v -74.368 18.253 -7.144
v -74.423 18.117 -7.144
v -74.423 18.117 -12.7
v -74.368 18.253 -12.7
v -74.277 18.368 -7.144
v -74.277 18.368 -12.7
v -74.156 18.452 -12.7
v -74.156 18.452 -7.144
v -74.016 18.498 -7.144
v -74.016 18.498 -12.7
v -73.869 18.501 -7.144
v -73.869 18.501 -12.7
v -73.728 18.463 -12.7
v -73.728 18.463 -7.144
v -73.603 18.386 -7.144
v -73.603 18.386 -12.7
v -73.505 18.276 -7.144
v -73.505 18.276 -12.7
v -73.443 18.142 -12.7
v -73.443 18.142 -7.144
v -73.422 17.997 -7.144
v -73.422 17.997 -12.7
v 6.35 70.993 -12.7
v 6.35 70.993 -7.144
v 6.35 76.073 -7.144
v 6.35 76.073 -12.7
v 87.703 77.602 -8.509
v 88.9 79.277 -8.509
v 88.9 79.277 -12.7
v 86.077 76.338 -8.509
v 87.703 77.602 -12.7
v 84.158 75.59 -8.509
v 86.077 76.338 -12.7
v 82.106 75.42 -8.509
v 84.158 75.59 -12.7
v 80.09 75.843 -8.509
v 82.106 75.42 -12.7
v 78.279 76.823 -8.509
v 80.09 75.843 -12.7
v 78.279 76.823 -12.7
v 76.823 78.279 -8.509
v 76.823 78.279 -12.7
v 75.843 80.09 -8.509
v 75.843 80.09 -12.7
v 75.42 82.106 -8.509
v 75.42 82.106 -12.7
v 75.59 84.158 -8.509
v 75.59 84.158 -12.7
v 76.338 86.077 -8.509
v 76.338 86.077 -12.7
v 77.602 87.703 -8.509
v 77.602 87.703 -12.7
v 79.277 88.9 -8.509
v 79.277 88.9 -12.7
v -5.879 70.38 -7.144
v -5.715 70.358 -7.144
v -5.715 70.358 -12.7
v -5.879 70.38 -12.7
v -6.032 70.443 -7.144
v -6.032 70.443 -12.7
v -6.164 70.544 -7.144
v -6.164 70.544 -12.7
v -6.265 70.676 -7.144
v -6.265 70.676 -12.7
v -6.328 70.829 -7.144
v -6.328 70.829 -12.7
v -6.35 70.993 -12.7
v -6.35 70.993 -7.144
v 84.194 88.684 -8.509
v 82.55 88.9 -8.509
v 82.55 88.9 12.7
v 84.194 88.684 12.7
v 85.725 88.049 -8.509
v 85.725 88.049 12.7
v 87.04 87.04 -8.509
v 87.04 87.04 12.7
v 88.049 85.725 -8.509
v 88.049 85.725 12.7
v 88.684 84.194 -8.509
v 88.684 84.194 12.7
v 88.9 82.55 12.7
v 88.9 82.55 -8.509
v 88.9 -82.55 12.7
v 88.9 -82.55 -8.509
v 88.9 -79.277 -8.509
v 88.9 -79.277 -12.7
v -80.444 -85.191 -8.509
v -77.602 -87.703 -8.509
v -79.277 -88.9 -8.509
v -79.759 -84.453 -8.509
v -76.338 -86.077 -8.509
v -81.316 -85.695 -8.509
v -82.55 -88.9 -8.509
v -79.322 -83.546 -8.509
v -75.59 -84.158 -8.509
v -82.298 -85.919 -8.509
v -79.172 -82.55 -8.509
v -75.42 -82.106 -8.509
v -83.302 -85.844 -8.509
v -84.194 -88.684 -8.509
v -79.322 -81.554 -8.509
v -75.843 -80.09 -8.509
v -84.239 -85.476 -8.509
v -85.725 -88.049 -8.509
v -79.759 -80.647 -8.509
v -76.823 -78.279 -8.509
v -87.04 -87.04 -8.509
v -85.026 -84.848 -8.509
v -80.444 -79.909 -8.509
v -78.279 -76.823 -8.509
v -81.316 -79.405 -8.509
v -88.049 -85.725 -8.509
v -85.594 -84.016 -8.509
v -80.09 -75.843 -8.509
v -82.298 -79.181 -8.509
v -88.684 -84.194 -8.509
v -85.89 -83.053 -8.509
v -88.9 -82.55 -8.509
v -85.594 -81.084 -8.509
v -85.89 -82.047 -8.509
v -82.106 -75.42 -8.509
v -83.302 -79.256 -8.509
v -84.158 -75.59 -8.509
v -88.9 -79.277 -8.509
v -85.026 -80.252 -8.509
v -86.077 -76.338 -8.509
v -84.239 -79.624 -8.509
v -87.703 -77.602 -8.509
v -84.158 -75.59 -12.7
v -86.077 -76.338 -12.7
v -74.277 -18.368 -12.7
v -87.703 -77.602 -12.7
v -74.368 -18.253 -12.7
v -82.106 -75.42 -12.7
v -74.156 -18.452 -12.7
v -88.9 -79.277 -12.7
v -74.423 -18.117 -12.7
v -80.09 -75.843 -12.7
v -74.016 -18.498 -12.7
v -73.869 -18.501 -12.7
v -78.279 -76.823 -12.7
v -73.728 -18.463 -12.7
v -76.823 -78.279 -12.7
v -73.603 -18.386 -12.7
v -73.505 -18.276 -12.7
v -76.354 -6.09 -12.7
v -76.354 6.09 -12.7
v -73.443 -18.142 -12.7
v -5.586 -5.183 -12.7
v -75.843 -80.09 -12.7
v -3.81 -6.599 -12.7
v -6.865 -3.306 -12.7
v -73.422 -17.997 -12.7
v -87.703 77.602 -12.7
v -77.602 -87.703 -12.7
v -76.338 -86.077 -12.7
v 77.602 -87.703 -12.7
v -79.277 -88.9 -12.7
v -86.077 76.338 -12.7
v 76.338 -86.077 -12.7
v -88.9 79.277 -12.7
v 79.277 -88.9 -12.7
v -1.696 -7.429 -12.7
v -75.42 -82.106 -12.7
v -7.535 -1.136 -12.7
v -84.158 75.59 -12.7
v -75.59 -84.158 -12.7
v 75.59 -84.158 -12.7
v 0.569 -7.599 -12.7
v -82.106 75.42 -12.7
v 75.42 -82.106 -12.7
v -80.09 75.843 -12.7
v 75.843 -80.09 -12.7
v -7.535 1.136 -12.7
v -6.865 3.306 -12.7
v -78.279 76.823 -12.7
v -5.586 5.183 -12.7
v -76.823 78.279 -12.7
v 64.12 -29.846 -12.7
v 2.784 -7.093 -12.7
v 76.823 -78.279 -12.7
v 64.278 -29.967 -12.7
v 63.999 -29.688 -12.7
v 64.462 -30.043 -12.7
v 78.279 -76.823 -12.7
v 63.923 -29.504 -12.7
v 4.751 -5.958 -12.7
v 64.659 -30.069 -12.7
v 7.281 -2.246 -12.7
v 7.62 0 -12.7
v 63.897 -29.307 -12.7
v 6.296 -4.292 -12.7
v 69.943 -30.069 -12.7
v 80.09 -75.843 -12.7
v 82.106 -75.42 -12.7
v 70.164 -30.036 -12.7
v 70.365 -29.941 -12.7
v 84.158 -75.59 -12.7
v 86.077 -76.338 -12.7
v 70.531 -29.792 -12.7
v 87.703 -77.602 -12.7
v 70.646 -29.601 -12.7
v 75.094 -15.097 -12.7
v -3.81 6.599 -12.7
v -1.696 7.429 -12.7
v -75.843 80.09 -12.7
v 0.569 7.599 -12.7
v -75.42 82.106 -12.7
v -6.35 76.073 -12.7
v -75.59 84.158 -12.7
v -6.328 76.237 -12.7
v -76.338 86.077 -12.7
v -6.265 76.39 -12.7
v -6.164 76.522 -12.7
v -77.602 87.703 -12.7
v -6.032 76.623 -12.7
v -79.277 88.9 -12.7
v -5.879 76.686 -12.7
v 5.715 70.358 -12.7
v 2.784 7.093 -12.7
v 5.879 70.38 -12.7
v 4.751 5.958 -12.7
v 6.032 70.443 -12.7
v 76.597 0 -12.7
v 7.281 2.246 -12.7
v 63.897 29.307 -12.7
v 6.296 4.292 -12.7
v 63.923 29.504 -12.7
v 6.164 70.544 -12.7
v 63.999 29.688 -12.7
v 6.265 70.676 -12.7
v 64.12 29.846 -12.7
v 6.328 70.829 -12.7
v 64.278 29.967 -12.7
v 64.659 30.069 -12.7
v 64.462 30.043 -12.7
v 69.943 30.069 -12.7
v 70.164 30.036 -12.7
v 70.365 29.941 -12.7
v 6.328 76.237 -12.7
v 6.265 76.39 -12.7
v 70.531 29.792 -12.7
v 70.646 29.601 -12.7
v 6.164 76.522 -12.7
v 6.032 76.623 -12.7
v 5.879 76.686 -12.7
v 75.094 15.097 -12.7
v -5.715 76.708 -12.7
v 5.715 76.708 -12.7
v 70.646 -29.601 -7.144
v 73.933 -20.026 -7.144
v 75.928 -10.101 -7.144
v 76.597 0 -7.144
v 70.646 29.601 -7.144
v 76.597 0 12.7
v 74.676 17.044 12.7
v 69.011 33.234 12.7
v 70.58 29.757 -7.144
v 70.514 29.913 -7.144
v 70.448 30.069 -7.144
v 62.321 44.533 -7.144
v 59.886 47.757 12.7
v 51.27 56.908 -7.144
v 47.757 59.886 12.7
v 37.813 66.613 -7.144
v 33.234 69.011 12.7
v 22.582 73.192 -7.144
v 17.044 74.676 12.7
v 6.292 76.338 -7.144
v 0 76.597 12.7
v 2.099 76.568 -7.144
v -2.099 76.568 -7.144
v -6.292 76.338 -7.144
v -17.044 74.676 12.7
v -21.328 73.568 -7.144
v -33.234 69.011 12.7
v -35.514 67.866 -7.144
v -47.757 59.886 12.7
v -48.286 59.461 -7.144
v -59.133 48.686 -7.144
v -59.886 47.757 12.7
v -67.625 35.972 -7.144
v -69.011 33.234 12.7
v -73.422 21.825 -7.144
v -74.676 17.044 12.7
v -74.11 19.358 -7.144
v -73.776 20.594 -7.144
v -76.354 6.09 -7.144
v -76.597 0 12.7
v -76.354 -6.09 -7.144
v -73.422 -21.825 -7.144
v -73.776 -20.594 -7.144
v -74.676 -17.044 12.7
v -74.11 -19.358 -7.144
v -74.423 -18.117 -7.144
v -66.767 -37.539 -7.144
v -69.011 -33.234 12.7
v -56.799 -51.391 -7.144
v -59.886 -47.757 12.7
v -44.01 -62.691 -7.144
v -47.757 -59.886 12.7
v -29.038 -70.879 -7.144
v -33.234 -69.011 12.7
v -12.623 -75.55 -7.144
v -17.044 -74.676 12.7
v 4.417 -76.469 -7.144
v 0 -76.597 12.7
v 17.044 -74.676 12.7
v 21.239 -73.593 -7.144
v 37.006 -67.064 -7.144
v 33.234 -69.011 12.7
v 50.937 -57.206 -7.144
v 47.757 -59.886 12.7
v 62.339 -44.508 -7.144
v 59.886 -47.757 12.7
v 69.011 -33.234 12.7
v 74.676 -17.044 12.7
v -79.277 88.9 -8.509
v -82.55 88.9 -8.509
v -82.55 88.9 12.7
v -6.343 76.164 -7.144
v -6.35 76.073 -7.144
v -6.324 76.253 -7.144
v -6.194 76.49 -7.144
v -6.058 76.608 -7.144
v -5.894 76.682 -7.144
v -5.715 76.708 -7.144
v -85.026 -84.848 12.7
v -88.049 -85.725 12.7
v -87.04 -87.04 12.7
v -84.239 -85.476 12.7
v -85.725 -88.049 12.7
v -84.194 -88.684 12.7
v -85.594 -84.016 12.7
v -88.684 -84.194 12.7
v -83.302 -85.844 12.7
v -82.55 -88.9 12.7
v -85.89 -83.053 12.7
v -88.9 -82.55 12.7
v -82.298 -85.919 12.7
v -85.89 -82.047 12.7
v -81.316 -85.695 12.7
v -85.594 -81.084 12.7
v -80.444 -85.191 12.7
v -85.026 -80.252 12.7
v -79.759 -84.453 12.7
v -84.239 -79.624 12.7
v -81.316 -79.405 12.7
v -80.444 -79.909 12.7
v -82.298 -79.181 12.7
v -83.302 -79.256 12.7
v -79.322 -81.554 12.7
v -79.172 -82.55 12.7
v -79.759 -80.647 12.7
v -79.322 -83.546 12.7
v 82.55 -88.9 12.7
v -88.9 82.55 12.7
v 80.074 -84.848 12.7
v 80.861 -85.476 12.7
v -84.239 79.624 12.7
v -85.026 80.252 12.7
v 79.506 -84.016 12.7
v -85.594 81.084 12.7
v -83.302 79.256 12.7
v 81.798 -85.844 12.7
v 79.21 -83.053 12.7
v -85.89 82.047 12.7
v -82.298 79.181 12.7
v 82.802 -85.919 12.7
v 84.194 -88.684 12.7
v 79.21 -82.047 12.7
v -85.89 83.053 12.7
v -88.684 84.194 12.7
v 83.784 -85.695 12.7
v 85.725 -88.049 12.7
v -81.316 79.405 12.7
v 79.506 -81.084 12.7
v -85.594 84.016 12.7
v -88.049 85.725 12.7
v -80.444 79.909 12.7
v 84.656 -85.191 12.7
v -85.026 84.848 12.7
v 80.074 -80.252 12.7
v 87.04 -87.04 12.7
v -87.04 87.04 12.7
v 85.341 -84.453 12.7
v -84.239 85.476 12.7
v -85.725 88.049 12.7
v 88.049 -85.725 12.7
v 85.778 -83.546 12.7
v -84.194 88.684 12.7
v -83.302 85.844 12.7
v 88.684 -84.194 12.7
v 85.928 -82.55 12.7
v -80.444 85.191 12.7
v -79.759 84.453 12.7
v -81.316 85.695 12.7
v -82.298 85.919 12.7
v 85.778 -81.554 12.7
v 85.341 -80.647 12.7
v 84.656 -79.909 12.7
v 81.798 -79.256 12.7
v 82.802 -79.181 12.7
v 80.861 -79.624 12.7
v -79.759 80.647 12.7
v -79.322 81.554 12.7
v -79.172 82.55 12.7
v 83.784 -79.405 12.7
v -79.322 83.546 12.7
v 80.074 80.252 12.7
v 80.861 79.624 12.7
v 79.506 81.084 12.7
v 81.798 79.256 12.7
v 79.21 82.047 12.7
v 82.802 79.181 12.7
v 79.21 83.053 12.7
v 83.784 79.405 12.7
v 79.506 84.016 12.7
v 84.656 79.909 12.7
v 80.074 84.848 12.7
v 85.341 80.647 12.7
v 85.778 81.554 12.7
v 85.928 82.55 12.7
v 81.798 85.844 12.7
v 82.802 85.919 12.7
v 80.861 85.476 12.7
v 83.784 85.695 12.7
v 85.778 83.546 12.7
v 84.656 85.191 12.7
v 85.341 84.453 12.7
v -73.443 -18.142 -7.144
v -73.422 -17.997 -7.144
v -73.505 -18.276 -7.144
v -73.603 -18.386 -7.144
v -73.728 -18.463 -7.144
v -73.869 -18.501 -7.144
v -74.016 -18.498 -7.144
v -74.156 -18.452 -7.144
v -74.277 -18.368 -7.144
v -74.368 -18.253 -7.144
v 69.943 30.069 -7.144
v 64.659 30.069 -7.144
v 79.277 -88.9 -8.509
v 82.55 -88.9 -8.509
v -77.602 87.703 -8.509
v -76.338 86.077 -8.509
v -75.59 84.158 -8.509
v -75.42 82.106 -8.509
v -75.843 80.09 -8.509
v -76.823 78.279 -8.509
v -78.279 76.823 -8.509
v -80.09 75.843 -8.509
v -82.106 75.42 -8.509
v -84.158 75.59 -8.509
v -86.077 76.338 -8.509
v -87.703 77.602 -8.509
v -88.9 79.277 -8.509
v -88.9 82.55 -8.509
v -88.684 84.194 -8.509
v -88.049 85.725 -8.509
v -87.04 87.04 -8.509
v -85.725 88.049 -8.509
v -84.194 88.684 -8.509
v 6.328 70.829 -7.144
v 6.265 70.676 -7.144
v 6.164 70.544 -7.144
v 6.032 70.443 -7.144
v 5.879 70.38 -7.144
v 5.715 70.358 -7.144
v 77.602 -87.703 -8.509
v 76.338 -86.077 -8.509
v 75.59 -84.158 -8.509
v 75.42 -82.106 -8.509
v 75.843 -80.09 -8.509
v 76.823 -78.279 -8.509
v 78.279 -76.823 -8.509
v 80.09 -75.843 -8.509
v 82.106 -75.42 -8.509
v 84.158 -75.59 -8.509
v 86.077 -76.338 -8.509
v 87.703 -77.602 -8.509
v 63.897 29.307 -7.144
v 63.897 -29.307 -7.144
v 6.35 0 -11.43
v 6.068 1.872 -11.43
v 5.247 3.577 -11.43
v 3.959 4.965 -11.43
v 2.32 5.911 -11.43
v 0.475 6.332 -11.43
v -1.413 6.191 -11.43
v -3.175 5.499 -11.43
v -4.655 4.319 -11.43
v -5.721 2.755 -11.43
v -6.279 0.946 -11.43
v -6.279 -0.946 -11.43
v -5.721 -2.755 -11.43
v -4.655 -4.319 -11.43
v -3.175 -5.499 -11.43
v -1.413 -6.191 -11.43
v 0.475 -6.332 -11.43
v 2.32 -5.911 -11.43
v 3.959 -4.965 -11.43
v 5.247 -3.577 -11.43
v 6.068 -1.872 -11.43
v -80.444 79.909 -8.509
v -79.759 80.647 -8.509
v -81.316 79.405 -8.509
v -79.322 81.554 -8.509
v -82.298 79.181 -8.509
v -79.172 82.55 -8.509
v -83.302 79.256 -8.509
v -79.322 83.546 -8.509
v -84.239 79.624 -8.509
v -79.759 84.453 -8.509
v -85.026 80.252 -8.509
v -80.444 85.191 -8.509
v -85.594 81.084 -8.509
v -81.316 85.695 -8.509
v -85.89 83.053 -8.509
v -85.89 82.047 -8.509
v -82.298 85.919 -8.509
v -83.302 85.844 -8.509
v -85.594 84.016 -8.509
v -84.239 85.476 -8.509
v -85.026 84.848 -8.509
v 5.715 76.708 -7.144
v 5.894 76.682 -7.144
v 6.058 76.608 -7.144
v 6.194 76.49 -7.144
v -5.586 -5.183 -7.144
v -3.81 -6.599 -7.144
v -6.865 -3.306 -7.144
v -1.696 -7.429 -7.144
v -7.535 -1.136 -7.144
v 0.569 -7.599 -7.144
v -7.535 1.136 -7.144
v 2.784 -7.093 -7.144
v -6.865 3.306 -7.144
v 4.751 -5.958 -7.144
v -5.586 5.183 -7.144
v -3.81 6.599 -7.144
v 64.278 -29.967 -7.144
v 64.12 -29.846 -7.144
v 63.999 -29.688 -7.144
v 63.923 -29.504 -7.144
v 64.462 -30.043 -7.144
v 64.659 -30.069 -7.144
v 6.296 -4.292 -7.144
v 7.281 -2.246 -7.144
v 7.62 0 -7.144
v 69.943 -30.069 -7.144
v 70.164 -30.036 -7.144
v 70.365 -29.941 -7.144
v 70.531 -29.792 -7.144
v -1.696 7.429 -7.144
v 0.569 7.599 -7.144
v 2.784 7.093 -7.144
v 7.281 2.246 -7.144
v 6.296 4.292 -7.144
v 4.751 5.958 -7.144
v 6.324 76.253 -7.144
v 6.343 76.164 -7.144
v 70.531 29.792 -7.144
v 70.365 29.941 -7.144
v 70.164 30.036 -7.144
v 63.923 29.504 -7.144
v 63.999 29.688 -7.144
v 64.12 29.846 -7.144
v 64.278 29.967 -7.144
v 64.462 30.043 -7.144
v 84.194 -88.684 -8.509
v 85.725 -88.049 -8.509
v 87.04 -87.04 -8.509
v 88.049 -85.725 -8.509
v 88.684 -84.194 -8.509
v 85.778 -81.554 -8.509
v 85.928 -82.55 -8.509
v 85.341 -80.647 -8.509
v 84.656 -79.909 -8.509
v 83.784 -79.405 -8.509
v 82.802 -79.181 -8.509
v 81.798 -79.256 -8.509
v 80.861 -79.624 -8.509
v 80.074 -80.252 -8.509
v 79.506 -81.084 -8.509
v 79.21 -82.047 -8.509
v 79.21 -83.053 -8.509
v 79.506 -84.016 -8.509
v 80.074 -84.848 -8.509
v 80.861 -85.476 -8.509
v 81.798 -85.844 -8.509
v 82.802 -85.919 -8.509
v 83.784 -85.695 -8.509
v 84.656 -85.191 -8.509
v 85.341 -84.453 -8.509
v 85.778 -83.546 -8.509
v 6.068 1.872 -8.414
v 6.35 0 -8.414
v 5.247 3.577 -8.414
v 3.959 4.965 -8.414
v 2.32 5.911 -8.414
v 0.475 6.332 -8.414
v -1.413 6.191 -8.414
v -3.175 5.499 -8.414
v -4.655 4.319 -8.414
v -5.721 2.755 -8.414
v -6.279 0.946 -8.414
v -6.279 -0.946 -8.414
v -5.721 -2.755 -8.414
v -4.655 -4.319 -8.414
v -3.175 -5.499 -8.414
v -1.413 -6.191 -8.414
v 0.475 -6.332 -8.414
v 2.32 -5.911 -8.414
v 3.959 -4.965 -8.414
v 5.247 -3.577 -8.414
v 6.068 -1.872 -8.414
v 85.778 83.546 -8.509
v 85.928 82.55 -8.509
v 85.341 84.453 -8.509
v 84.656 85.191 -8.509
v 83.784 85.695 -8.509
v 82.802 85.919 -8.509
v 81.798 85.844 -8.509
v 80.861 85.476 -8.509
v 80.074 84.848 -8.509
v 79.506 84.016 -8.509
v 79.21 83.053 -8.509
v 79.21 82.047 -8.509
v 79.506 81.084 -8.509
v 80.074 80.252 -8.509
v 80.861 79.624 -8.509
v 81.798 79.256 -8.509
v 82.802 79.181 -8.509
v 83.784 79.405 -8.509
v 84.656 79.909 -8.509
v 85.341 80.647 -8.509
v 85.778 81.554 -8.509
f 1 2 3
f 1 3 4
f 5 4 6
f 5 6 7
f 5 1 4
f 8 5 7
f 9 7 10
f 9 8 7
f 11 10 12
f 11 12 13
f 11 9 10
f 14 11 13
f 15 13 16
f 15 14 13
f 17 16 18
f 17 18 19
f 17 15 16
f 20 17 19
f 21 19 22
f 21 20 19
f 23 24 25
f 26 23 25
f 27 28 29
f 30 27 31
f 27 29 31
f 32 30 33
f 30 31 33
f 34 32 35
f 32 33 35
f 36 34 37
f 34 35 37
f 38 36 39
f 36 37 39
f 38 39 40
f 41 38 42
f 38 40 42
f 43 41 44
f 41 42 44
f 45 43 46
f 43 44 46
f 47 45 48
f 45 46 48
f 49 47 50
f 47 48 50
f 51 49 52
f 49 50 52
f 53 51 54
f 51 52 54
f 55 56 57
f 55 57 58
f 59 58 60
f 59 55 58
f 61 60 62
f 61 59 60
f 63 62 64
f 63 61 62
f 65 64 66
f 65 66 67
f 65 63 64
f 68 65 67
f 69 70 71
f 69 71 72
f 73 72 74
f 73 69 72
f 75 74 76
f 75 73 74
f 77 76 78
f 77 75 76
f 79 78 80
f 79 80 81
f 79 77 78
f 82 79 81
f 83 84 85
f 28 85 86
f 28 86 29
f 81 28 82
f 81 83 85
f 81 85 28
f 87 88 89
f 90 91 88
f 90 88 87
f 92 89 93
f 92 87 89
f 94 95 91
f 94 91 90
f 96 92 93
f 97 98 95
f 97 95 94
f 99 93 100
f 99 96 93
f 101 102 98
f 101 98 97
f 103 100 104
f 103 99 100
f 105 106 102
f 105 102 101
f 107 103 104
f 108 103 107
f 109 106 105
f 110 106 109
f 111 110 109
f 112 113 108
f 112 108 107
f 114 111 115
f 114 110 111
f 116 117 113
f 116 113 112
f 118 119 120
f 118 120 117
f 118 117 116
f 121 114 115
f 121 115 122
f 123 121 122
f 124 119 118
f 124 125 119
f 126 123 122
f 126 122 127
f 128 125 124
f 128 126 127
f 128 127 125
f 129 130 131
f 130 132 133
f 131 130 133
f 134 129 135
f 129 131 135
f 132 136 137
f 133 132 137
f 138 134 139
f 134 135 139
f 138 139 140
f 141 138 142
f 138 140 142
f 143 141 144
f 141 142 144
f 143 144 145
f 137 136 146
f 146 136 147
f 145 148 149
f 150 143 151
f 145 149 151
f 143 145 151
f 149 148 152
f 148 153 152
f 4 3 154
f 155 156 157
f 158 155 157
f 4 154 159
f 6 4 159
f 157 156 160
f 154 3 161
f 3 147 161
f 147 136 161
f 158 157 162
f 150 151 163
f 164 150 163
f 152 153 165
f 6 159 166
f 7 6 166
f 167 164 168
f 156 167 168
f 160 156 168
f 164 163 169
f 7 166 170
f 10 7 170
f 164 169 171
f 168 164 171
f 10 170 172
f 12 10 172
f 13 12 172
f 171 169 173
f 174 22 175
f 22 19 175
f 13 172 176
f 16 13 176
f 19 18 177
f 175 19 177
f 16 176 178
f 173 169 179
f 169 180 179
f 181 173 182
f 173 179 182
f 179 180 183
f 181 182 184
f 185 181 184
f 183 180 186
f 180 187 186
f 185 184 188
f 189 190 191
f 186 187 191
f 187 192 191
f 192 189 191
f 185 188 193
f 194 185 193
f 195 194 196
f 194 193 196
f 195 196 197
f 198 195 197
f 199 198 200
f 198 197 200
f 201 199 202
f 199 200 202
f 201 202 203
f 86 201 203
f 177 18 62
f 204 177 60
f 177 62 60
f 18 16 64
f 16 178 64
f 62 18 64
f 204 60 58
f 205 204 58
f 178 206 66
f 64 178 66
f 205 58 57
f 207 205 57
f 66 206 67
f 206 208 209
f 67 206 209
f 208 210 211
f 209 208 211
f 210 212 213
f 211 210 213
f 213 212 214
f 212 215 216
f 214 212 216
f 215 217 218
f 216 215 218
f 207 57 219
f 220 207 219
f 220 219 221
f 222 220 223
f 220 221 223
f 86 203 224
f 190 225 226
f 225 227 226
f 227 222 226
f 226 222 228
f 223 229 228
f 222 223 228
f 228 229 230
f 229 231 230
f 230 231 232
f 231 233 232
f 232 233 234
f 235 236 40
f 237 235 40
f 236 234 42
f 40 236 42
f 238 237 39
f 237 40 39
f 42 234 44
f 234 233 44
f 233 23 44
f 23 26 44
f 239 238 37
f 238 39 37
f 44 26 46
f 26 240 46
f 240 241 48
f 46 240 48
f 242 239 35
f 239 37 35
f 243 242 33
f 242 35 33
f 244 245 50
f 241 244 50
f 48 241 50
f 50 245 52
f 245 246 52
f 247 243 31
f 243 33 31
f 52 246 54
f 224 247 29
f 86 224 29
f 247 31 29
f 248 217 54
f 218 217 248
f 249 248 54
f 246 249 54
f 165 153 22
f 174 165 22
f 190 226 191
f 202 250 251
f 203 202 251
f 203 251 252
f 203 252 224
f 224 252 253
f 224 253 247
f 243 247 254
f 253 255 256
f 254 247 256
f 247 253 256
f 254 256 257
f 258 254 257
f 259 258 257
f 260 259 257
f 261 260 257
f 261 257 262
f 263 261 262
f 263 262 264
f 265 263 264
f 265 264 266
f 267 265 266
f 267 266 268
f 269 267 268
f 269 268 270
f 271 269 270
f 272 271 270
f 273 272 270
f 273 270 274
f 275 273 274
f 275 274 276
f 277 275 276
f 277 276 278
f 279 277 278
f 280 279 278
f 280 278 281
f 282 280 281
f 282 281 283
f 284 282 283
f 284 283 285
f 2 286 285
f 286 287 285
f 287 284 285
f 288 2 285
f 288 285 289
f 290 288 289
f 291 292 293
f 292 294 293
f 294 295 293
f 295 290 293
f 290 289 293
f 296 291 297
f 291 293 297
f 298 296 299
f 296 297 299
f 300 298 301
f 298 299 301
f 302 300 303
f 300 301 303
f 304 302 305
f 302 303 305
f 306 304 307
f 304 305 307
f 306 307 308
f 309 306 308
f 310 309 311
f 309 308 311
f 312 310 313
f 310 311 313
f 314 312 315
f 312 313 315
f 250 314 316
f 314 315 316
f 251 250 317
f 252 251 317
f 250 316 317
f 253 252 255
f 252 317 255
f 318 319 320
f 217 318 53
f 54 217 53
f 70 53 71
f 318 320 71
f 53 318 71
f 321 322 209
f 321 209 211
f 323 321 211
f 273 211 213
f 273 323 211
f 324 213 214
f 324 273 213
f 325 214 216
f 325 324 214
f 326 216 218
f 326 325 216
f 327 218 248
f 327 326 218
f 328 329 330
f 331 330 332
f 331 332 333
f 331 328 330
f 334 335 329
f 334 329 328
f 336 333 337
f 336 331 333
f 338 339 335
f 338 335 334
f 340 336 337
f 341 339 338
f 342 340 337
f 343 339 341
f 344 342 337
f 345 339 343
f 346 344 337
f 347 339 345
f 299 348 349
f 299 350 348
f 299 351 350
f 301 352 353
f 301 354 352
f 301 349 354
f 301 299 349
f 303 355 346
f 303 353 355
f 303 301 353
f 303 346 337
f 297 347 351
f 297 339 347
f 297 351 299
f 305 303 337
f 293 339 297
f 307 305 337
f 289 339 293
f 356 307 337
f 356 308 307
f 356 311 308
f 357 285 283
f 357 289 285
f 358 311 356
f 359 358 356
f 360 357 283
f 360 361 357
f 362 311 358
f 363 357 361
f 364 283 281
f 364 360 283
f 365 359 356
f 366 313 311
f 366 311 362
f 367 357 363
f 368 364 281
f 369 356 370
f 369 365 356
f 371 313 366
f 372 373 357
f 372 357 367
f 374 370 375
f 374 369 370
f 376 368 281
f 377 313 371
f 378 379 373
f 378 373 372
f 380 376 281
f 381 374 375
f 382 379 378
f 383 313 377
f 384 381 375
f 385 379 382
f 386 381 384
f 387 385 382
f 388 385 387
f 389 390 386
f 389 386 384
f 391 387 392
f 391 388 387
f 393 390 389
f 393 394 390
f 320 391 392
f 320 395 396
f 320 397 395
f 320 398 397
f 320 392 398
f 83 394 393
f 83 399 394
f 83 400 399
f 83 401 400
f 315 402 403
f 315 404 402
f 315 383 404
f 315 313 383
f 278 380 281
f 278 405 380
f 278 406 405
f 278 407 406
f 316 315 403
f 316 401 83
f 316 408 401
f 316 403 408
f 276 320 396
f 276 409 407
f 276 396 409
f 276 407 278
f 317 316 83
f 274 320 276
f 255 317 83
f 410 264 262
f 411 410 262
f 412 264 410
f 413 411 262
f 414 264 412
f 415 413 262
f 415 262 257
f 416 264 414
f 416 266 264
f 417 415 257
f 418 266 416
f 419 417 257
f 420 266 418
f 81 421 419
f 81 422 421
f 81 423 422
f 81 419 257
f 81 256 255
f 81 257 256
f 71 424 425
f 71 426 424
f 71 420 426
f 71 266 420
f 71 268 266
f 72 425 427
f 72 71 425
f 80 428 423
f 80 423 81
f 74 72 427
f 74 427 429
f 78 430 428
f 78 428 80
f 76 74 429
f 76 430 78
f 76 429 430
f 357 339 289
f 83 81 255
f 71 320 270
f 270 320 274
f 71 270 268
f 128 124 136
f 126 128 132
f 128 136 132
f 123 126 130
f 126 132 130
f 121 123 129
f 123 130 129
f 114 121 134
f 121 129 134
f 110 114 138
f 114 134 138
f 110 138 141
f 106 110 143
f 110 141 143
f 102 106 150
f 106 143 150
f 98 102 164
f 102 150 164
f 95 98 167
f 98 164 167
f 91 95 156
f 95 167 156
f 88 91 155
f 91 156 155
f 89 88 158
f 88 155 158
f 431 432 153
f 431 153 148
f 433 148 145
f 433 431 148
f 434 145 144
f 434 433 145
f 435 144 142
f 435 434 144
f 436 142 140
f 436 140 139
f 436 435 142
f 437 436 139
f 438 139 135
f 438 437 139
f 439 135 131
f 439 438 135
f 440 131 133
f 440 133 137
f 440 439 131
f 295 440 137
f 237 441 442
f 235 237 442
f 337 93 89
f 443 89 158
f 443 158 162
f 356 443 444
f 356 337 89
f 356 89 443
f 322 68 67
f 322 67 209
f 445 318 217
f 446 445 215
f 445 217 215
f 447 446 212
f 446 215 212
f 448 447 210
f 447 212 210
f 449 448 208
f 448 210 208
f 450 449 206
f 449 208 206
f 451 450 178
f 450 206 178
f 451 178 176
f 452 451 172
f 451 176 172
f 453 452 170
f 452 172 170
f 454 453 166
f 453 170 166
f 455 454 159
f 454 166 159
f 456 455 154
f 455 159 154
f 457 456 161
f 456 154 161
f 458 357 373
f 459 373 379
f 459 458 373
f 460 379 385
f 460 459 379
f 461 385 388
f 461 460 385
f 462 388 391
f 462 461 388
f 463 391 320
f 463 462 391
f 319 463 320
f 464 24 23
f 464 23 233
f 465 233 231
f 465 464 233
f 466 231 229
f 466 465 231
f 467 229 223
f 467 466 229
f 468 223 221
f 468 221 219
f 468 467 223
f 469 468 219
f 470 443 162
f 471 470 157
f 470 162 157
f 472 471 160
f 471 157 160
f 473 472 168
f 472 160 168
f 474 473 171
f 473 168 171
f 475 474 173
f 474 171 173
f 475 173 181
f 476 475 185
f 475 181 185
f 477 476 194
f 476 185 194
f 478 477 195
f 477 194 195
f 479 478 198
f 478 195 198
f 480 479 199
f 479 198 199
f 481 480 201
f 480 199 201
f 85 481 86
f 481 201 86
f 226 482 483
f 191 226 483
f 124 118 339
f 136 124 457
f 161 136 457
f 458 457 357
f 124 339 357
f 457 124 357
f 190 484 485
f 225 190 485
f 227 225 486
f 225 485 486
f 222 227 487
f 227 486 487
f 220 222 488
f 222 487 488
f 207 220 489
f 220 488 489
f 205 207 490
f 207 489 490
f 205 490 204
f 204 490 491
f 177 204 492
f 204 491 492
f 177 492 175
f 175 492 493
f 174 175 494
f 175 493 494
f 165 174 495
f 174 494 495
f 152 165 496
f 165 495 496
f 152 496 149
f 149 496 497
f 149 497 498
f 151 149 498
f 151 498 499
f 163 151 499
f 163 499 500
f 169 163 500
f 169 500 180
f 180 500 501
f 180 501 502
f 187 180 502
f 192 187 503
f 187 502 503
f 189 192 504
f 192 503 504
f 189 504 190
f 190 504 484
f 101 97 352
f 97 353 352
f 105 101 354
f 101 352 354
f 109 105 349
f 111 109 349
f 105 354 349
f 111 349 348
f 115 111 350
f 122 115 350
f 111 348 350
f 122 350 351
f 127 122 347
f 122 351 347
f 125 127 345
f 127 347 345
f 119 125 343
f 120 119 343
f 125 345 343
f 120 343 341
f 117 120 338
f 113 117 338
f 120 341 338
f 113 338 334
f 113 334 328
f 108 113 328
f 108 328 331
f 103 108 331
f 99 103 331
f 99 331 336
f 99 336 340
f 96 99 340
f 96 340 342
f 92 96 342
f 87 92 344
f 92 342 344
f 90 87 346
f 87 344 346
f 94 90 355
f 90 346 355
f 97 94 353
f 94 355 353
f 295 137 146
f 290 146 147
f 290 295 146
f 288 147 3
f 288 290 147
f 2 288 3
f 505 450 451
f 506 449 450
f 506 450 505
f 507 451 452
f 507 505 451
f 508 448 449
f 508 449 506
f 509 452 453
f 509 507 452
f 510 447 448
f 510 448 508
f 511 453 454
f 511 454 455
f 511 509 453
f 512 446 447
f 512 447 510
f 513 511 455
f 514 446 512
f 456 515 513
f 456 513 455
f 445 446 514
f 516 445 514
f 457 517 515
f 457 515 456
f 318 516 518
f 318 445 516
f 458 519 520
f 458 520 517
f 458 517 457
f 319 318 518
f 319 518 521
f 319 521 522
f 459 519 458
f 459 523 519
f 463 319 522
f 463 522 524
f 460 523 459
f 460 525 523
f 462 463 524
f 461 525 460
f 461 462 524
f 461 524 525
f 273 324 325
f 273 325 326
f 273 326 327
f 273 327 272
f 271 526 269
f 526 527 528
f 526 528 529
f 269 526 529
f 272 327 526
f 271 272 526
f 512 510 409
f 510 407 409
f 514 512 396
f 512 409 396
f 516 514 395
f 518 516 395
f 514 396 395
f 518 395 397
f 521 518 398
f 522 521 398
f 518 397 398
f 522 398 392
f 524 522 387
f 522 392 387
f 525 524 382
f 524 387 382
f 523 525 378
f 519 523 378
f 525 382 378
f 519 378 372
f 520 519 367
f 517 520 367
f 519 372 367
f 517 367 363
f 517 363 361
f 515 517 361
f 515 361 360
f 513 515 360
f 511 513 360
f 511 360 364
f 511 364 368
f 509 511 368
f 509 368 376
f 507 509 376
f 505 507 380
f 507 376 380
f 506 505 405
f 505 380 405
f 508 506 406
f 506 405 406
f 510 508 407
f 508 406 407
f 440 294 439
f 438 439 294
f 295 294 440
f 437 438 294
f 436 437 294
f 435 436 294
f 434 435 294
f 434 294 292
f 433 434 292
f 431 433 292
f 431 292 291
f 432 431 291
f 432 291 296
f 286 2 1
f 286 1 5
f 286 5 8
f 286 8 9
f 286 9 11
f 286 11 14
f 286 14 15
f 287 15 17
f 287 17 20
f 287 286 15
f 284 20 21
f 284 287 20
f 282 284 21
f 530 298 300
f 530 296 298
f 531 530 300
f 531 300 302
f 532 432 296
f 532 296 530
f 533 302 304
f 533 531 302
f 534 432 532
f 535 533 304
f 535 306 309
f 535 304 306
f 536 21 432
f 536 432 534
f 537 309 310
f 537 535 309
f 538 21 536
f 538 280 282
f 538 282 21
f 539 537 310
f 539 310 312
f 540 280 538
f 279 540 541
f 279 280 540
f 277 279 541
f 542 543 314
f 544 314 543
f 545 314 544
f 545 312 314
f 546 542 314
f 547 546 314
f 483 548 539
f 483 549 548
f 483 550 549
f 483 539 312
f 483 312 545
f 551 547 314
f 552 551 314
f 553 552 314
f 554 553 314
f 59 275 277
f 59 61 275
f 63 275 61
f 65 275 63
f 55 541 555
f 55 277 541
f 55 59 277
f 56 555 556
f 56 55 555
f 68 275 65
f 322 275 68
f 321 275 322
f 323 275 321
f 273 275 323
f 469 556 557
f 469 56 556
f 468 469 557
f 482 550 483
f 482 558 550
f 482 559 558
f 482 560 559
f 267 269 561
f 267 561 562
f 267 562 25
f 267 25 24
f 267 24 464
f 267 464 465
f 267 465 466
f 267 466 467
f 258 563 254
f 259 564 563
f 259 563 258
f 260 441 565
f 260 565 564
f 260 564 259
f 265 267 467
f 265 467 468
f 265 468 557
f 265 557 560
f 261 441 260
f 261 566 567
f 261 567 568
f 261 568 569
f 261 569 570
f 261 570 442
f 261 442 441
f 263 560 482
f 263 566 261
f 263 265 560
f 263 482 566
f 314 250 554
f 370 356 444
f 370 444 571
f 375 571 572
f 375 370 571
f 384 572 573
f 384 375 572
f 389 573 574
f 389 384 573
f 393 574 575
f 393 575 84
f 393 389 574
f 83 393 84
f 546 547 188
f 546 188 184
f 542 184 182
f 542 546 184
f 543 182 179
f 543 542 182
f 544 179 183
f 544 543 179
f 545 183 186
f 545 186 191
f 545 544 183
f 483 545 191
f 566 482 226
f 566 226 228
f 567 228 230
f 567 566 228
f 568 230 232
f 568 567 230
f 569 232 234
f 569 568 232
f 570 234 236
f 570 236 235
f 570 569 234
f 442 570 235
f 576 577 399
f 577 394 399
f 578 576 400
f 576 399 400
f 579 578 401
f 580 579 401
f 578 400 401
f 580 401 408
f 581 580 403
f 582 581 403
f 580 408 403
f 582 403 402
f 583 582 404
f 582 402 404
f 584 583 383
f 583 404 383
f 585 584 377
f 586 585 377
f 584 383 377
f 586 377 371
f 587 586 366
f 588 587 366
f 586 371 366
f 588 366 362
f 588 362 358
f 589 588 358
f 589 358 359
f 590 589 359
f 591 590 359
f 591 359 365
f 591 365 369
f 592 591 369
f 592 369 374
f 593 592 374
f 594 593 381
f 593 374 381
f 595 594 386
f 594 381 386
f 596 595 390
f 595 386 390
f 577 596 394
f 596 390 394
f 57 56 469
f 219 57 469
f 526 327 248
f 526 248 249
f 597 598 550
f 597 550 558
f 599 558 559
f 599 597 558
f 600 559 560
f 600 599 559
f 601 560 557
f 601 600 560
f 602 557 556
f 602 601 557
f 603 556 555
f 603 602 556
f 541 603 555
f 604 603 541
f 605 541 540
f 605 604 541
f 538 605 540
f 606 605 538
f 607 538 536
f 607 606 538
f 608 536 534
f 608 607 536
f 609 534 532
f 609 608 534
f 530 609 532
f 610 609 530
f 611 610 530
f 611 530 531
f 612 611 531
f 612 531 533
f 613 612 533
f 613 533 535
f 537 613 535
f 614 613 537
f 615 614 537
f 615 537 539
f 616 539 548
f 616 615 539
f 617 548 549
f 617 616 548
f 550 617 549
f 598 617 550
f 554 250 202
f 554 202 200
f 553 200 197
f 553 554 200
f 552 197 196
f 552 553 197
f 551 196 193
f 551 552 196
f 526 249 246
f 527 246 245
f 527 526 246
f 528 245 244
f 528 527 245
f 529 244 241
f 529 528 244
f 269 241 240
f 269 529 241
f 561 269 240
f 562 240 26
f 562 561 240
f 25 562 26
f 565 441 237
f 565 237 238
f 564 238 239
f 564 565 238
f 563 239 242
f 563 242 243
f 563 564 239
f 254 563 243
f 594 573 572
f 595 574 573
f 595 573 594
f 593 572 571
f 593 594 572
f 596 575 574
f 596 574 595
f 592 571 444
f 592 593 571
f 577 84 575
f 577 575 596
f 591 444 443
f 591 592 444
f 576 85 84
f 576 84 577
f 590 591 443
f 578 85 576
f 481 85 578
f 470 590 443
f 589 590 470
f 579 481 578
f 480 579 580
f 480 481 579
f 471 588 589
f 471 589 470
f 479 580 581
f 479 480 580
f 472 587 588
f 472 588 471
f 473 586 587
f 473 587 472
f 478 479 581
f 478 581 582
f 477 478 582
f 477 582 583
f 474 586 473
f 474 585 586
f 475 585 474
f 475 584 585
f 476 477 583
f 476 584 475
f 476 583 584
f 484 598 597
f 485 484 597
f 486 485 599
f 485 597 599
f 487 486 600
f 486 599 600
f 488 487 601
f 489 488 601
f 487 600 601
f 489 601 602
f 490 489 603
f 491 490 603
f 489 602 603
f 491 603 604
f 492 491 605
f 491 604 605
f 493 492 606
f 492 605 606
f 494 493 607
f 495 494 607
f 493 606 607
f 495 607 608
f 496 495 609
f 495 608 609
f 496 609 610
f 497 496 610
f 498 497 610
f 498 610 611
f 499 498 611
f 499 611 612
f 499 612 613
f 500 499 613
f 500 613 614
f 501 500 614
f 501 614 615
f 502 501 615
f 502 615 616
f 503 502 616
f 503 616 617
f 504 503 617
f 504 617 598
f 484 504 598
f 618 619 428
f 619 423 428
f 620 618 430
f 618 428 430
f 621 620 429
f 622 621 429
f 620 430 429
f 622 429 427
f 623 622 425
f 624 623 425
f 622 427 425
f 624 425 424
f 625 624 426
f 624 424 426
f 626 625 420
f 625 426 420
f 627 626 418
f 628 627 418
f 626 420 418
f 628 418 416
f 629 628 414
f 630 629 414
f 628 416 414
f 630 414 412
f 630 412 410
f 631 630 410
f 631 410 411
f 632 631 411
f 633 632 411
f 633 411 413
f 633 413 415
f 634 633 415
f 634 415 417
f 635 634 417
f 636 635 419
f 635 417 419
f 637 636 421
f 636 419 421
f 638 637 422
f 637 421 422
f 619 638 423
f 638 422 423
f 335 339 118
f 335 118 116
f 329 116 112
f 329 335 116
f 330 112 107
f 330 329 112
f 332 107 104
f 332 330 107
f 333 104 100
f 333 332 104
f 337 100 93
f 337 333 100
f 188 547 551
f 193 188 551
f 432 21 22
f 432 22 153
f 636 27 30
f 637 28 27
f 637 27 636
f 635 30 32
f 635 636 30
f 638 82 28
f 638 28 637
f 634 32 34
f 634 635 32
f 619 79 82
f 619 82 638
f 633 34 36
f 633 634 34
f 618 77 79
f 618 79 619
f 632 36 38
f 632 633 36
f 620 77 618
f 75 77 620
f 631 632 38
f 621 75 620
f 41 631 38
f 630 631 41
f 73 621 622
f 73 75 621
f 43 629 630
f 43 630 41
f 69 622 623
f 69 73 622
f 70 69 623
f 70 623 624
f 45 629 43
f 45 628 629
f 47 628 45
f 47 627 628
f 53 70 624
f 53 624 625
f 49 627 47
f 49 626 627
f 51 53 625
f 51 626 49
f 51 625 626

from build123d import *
from build123d.topology import SkipClean

# Parameters (mm, degrees)
SKETCH1_W                                            = 177.8
SKETCH1_H                                            = 177.8
BOSS_EXTRUDE1_DEPTH                                  = 12.7
SKETCH2_R                                            = 76.596875
CUT_EXTRUDE1_DEPTH                                   = 19.84375
SKETCH3_R                                            = 6.35
CUT_EXTRUDE2_DEPTH                                   = 19.84375
SKETCH5_W                                            = 12.7
SKETCH5_H                                            = 6.35
CUT_EXTRUDE3_DEPTH                                   = 19.84375
FILLET1_R                                            = 6.35
FILLET2_R                                            = 0.635
FILLET3_R                                            = 0.508
CHAMFER2_SIZE                                        = 1.27
FILLET5_R                                            = 0.762
CBORE_FOR_1_4_BINDING_HEAD_MACHINE_SCREW_D           = 6.7564
CBORE_FOR_1_4_BINDING_HEAD_MACHINE_SCREW_CBORE_D     = 14.2875
CBORE_FOR_1_4_BINDING_HEAD_MACHINE_SCREW_CBORE_DEPTH = 4.191


with BuildPart() as part:
    # Sketch1 → Boss-Extrude1 (new, symmetric)
    with BuildSketch(Plane.XY):
        Rectangle(SKETCH1_W, SKETCH1_H)
    extrude(amount=BOSS_EXTRUDE1_DEPTH, both=True)

    # Sketch2 → Cut-Extrude1 (cut)
    with BuildSketch(Plane.XY.offset(12.7)):
        Circle(SKETCH2_R)
    extrude(amount=-CUT_EXTRUDE1_DEPTH, mode=Mode.SUBTRACT)

    # Sketch3 → Cut-Extrude2 (cut)
    with BuildSketch(Plane.XY.offset(-7.14375)):
        Circle(SKETCH3_R)
    extrude(amount=-CUT_EXTRUDE2_DEPTH, mode=Mode.SUBTRACT)

    # Sketch5 → Cut-Extrude3 (cut)
    with SkipClean():  # the faces are left unmerged after this step: merging them gives an invalid solid
        with BuildSketch(Plane.XY.offset(-7.14375)):
            with BuildLine():
                Line((-73.421875, 21.824516747), (-73.421875, -21.824516747))
                ThreePointArc((-73.421875, -21.824516747), (-76.596875, 0), (-73.421875, 21.824516747))
            make_face()
            with Locations((0, 73.533)):
                Rectangle(SKETCH5_W, SKETCH5_H)
            with BuildLine():
                Line((63.896875, 30.068721747), (63.896875, -30.068721747))
                Line((63.896875, -30.068721747), (70.448230867, -30.068721747))
                ThreePointArc((70.448230867, -30.068721747), (76.596875, 0), (70.448230867, 30.068721747))
                Line((70.448230867, 30.068721747), (63.896875, 30.068721747))
            make_face()
        extrude(amount=-CUT_EXTRUDE3_DEPTH, mode=Mode.SUBTRACT)

    # Fillet1
    fillet1_edges = [part.edges().sort_by_distance(p)[0] for p in [
        (88.9, 88.9, 0),
        (88.9, -88.9, 0),
        (-88.9, -88.9, 0),
        (-88.9, 88.9, 0),
    ]]
    fillet(fillet1_edges, radius=FILLET1_R)

    # Fillet2
    # the kernel refuses this fillet: 0.635 mm, written as the material it adds along each edge
    with BuildSketch(Plane(origin=(-6.35, 76.708, -7.14375), x_dir=(0, -1, 0), z_dir=(0, 0, -1))) as fillet2_piece_1:
        with BuildLine():
            CenterArc((FILLET2_R, -FILLET2_R), FILLET2_R, 90, 90)
            Line((0, -FILLET2_R), (0, 0))
            Line((0, 0), (FILLET2_R, 0))
        make_face()
    extrude(amount=5.55625)
    with BuildSketch(Plane(origin=(-6.35, 70.358, -7.14375), x_dir=(0, 1, 0), z_dir=(0, 0, -1)), Plane(origin=(6.35, 76.708, -7.14375), x_dir=(0, -1, 0), z_dir=(0, 0, -1)), Plane(origin=(6.35, 70.358, -7.14375), x_dir=(-1, 0, 0), z_dir=(0, 0, -1))) as fillet2_piece_2:
        with BuildLine():
            CenterArc((FILLET2_R, FILLET2_R), FILLET2_R, 180, 90)
            Line((0, FILLET2_R), (0, 0))
            Line((0, 0), (FILLET2_R, 0))
        make_face()
    extrude(amount=5.55625)

    # Fillet3
    # the kernel refuses this fillet: 0.508 mm, written as the material it adds along each edge
    with BuildSketch(Plane(origin=(-73.421875, -21.824516747, -7.14375), x_dir=(0, 1, 0), z_dir=(0, 0, -1))) as fillet3_piece_1:
        with BuildLine():
            CenterArc((3.827559192, -0.508), FILLET3_R, 90, 166.318438428)
            ThreePointArc((3.707404249, -1.001585646), (1.847424112, -0.524031105), (0, 0))
            Line((0, 0), (3.827559192, 0))
        make_face()
    extrude(amount=5.55625)
    with BuildSketch(Plane(origin=(-73.421875, 21.824516747, -7.14375), x_dir=(0, -1, 0), z_dir=(0, 0, -1))) as fillet3_piece_2:
        with BuildLine():
            CenterArc((3.827559192, 0.508), FILLET3_R, 103.681561572, 166.318438428)
            ThreePointArc((3.707404249, 1.001585646), (1.847424112, 0.524031105), (0, 0))
            Line((0, 0), (3.827559192, 0))
        make_face()
    extrude(amount=5.55625)

    # Chamfer2
    chamfer2_edges = [part.edges().sort_by_distance(p)[0] for p in [
        (-6.35, 0, -12.7),
        (-6.35, 0, -7.14375),
    ]]
    chamfer(chamfer2_edges, length=CHAMFER2_SIZE)

    # Fillet5
    # the kernel refuses this fillet: 0.762 mm, written as the material it adds along each edge
    with BuildSketch(Plane(origin=(70.448230867, -30.068721747, -7.14375), x_dir=(-1, 0, 0), z_dir=(0, 0, -1))) as fillet5_piece_1:
        with BuildLine():
            CenterArc((0.505080189, 0.762), FILLET5_R, 202.734061429, 67.265938571)
            ThreePointArc((-0.197718896, 0.467521741), (-0.099246736, 0.233597083), (0, 0))
            Line((0, 0), (0.505080189, 0))
        make_face()
    extrude(amount=5.55625)
    with BuildSketch(Plane(origin=(63.896875, -30.068721747, -7.14375), x_dir=(1, 0, 0), z_dir=(0, 0, -1)), Plane(origin=(63.896875, 30.068721747, -7.14375), x_dir=(0, -1, 0), z_dir=(0, 0, -1))) as fillet5_piece_2:
        with BuildLine():
            CenterArc((FILLET5_R, -FILLET5_R), FILLET5_R, 90, 90)
            Line((0, -FILLET5_R), (0, 0))
            Line((0, 0), (FILLET5_R, 0))
        make_face()
    extrude(amount=5.55625)
    with BuildSketch(Plane(origin=(70.448230867, 30.068721747, -7.14375), x_dir=(-1, 0, 0), z_dir=(0, 0, -1))) as fillet5_piece_3:
        with BuildLine():
            CenterArc((0.505080189, -0.762), FILLET5_R, 90, 67.265938571)
            ThreePointArc((-0.197718896, -0.467521741), (-0.099246736, -0.233597083), (0, 0))
            Line((0, 0), (0.505080189, 0))
        make_face()
    extrude(amount=5.55625)

    # CBORE for 1/4 Binding Head Machine Screw1 (through all)
    with Locations(Plane(origin=(0, 0, -12.7), x_dir=(-1, 0, 0), z_dir=(0, 0, -1))):
        with Locations((-82.55, 82.55), (82.55, 82.55), (82.55, -82.55), (-82.55, -82.55)):
            CounterBoreHole(CBORE_FOR_1_4_BINDING_HEAD_MACHINE_SCREW_D / 2, CBORE_FOR_1_4_BINDING_HEAD_MACHINE_SCREW_CBORE_D / 2, CBORE_FOR_1_4_BINDING_HEAD_MACHINE_SCREW_CBORE_DEPTH)


solid = part.part
